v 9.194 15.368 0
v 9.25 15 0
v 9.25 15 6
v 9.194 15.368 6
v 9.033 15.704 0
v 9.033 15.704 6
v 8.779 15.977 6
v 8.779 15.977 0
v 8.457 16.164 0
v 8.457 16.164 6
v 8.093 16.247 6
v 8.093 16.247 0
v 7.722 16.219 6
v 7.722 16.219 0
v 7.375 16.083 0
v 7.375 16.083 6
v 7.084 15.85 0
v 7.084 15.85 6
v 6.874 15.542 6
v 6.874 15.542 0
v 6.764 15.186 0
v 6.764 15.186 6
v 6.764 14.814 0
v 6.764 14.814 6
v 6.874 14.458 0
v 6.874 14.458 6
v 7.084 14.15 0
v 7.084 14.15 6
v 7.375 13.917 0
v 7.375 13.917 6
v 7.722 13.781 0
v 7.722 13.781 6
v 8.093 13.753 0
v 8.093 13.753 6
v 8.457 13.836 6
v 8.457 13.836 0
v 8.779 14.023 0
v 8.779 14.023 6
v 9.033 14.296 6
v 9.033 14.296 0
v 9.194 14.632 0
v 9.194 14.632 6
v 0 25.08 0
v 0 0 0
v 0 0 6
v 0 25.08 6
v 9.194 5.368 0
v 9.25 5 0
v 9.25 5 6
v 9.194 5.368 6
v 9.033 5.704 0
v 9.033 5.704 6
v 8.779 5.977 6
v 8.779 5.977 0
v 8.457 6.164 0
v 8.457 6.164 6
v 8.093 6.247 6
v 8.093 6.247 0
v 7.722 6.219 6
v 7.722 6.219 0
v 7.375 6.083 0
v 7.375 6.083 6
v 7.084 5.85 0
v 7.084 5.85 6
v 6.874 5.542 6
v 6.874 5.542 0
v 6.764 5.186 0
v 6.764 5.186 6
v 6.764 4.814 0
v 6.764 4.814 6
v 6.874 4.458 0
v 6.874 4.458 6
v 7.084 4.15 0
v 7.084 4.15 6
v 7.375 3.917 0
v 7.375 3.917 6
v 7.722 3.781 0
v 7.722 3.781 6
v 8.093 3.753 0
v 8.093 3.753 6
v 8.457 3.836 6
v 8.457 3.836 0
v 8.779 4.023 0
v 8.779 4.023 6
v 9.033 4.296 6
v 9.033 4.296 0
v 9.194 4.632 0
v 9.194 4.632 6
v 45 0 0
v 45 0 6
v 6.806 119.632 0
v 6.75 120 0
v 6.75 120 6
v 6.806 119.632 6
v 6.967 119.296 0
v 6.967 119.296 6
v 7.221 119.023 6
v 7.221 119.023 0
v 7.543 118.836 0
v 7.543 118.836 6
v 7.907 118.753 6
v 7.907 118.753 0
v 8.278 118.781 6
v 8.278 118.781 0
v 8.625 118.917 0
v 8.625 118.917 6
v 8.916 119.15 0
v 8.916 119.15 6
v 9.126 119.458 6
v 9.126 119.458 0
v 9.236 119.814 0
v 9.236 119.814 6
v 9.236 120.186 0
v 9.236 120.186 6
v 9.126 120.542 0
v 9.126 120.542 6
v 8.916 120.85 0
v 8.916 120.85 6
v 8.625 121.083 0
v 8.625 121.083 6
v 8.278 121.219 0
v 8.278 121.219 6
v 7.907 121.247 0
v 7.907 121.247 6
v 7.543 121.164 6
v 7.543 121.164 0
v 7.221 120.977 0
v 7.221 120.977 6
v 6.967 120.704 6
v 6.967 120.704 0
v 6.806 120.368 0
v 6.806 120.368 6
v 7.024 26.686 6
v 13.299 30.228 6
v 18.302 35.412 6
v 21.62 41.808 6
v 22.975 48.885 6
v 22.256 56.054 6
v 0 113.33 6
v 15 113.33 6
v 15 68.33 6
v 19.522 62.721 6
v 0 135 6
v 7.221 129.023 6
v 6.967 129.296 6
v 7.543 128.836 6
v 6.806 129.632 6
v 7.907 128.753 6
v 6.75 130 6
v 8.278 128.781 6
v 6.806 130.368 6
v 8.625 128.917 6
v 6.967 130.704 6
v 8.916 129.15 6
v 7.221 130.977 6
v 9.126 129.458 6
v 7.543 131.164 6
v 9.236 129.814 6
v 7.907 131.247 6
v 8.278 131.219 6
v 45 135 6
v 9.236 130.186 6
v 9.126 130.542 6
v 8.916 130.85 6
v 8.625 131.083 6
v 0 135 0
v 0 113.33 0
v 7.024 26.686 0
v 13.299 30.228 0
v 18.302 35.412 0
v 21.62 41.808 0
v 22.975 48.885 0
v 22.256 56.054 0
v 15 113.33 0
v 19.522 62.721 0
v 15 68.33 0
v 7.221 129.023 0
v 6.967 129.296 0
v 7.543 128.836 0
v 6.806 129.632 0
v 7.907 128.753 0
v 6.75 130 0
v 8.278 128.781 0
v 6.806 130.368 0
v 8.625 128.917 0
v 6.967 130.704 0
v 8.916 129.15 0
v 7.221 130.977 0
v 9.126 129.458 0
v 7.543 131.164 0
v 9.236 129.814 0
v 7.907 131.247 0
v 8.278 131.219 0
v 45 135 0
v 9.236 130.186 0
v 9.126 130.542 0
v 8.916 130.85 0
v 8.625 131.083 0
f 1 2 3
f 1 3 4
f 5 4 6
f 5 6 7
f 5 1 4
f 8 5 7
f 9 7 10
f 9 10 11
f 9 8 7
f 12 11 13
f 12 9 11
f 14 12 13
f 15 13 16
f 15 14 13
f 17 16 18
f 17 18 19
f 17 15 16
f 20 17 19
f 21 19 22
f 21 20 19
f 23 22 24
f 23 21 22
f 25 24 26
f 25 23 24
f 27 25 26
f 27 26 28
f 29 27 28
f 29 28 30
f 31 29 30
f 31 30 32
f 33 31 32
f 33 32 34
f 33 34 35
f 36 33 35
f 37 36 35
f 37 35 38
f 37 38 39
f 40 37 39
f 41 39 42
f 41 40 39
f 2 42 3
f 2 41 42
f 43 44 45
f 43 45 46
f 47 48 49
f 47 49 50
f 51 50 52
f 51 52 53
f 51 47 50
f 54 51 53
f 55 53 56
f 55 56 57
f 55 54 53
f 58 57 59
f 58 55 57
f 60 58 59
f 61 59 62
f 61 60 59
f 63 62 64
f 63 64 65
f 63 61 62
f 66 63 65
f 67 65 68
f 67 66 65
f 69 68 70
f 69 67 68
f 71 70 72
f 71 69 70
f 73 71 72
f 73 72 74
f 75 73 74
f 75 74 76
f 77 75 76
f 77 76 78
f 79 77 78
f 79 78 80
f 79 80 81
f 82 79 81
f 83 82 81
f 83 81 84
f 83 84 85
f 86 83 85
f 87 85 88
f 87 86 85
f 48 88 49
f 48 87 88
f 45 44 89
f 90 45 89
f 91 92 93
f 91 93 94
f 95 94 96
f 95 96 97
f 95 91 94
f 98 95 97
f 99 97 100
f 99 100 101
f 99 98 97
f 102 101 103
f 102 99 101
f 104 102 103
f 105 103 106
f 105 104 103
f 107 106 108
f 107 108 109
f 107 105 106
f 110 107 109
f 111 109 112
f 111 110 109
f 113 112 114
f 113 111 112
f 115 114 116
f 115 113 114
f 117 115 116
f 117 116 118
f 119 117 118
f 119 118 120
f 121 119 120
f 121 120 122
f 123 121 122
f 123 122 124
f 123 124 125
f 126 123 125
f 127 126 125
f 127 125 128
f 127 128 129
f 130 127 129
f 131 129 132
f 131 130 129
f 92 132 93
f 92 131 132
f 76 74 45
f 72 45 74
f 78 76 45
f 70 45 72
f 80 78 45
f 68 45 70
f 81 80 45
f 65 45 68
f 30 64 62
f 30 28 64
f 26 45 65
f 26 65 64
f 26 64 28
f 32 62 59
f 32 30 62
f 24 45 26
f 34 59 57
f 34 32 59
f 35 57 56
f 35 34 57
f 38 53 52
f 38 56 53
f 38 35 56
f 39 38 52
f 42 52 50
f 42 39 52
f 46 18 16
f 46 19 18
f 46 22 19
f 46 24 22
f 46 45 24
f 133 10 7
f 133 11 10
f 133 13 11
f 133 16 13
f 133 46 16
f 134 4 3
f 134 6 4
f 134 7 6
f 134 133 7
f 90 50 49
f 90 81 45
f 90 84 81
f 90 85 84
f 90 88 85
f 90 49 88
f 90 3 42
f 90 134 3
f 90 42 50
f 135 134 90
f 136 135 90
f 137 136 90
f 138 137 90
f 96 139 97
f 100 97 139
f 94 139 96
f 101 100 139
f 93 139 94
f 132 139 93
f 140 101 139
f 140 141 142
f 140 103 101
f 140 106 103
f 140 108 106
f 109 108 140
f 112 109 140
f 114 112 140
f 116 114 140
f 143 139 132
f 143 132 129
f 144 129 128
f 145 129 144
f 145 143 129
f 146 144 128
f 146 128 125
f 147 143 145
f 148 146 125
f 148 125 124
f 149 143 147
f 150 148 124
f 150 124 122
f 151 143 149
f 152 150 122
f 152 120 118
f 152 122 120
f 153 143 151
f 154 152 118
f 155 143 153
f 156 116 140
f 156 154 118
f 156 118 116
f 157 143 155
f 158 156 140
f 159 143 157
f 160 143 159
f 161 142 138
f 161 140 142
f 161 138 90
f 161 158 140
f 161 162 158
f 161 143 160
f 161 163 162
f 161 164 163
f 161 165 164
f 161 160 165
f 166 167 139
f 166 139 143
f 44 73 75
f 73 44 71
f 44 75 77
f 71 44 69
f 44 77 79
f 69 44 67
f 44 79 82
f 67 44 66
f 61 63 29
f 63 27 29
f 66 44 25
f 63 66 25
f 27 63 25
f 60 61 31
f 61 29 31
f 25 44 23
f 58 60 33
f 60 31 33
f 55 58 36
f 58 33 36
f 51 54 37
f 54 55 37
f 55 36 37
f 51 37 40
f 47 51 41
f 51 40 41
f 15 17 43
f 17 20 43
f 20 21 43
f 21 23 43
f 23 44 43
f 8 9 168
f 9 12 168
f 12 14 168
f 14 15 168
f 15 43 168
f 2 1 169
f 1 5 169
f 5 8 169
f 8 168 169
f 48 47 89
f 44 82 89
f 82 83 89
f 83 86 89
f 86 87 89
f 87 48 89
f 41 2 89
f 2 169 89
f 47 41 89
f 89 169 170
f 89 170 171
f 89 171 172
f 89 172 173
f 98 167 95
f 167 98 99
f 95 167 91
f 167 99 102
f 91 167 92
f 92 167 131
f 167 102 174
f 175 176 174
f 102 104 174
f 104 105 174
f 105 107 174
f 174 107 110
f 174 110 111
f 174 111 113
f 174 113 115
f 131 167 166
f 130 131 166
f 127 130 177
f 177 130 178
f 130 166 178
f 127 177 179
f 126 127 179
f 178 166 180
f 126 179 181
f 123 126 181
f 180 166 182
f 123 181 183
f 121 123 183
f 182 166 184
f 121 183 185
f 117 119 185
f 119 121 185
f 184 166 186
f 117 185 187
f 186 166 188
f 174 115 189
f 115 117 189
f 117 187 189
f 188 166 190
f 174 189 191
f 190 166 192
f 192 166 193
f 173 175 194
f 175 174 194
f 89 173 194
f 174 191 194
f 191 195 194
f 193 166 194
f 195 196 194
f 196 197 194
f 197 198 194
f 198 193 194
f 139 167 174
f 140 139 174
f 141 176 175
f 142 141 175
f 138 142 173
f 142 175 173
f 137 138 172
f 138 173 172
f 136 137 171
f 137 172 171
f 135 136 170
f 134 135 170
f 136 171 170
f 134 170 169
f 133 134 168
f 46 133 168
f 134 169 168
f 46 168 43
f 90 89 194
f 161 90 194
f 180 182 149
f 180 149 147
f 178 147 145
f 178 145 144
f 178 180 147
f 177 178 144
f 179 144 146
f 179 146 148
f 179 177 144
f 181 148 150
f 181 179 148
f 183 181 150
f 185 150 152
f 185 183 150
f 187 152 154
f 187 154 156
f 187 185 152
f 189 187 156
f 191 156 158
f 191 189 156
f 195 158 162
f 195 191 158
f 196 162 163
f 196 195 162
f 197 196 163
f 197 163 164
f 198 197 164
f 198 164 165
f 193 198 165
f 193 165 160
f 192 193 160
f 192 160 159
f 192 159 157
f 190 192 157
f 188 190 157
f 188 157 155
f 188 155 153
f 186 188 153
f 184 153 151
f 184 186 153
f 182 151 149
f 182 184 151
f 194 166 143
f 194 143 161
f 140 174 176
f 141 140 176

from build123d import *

# Parameters (mm, degrees)
ESQUISSE1_W             = 45
ESQUISSE1_H             = 135
ESQUISSE1_R             = 1.25
BOSS_EXTRU_1_DEPTH      = 6
ENL_V_MAT_EXTRU_1_DEPTH = 143.428929646


with BuildPart() as part:
    # Esquisse1 → Boss.-Extru.1 (new body)
    with BuildSketch(Plane.XY):
        with Locations((22.5, 67.5)):
            Rectangle(ESQUISSE1_W, ESQUISSE1_H)
        with Locations((8, 5)):
            Circle(ESQUISSE1_R, mode=Mode.SUBTRACT)
        with Locations((8, 15)):
            Circle(ESQUISSE1_R, mode=Mode.SUBTRACT)
        with Locations(Location((8, 120, 0), (0, 0, 180))):
            Circle(ESQUISSE1_R, mode=Mode.SUBTRACT)
        with Locations(Location((8, 130, 0), (0, 0, 180))):
            Circle(ESQUISSE1_R, mode=Mode.SUBTRACT)
    extrude(amount=BOSS_EXTRU_1_DEPTH)

    # Esquisse2 → Enlèv. mat.-Extru.1 (cut, through all)
    with BuildSketch(Plane(origin=(0, 0, 0), x_dir=(-1, 0, 0), z_dir=(0, 0, -1))):
        with BuildLine():
            Line((0, 25.080128411), (0, 113.33030278))
            Line((0, 113.33030278), (-15, 113.33030278))
            Line((-15, 113.33030278), (-15, 68.33030278))
            ThreePointArc((-15, 68.33030278), (-21.619788224, 41.80819896), (0, 25.080128411))
        make_face()
    extrude(amount=-ENL_V_MAT_EXTRU_1_DEPTH, mode=Mode.SUBTRACT)


solid = part.part
